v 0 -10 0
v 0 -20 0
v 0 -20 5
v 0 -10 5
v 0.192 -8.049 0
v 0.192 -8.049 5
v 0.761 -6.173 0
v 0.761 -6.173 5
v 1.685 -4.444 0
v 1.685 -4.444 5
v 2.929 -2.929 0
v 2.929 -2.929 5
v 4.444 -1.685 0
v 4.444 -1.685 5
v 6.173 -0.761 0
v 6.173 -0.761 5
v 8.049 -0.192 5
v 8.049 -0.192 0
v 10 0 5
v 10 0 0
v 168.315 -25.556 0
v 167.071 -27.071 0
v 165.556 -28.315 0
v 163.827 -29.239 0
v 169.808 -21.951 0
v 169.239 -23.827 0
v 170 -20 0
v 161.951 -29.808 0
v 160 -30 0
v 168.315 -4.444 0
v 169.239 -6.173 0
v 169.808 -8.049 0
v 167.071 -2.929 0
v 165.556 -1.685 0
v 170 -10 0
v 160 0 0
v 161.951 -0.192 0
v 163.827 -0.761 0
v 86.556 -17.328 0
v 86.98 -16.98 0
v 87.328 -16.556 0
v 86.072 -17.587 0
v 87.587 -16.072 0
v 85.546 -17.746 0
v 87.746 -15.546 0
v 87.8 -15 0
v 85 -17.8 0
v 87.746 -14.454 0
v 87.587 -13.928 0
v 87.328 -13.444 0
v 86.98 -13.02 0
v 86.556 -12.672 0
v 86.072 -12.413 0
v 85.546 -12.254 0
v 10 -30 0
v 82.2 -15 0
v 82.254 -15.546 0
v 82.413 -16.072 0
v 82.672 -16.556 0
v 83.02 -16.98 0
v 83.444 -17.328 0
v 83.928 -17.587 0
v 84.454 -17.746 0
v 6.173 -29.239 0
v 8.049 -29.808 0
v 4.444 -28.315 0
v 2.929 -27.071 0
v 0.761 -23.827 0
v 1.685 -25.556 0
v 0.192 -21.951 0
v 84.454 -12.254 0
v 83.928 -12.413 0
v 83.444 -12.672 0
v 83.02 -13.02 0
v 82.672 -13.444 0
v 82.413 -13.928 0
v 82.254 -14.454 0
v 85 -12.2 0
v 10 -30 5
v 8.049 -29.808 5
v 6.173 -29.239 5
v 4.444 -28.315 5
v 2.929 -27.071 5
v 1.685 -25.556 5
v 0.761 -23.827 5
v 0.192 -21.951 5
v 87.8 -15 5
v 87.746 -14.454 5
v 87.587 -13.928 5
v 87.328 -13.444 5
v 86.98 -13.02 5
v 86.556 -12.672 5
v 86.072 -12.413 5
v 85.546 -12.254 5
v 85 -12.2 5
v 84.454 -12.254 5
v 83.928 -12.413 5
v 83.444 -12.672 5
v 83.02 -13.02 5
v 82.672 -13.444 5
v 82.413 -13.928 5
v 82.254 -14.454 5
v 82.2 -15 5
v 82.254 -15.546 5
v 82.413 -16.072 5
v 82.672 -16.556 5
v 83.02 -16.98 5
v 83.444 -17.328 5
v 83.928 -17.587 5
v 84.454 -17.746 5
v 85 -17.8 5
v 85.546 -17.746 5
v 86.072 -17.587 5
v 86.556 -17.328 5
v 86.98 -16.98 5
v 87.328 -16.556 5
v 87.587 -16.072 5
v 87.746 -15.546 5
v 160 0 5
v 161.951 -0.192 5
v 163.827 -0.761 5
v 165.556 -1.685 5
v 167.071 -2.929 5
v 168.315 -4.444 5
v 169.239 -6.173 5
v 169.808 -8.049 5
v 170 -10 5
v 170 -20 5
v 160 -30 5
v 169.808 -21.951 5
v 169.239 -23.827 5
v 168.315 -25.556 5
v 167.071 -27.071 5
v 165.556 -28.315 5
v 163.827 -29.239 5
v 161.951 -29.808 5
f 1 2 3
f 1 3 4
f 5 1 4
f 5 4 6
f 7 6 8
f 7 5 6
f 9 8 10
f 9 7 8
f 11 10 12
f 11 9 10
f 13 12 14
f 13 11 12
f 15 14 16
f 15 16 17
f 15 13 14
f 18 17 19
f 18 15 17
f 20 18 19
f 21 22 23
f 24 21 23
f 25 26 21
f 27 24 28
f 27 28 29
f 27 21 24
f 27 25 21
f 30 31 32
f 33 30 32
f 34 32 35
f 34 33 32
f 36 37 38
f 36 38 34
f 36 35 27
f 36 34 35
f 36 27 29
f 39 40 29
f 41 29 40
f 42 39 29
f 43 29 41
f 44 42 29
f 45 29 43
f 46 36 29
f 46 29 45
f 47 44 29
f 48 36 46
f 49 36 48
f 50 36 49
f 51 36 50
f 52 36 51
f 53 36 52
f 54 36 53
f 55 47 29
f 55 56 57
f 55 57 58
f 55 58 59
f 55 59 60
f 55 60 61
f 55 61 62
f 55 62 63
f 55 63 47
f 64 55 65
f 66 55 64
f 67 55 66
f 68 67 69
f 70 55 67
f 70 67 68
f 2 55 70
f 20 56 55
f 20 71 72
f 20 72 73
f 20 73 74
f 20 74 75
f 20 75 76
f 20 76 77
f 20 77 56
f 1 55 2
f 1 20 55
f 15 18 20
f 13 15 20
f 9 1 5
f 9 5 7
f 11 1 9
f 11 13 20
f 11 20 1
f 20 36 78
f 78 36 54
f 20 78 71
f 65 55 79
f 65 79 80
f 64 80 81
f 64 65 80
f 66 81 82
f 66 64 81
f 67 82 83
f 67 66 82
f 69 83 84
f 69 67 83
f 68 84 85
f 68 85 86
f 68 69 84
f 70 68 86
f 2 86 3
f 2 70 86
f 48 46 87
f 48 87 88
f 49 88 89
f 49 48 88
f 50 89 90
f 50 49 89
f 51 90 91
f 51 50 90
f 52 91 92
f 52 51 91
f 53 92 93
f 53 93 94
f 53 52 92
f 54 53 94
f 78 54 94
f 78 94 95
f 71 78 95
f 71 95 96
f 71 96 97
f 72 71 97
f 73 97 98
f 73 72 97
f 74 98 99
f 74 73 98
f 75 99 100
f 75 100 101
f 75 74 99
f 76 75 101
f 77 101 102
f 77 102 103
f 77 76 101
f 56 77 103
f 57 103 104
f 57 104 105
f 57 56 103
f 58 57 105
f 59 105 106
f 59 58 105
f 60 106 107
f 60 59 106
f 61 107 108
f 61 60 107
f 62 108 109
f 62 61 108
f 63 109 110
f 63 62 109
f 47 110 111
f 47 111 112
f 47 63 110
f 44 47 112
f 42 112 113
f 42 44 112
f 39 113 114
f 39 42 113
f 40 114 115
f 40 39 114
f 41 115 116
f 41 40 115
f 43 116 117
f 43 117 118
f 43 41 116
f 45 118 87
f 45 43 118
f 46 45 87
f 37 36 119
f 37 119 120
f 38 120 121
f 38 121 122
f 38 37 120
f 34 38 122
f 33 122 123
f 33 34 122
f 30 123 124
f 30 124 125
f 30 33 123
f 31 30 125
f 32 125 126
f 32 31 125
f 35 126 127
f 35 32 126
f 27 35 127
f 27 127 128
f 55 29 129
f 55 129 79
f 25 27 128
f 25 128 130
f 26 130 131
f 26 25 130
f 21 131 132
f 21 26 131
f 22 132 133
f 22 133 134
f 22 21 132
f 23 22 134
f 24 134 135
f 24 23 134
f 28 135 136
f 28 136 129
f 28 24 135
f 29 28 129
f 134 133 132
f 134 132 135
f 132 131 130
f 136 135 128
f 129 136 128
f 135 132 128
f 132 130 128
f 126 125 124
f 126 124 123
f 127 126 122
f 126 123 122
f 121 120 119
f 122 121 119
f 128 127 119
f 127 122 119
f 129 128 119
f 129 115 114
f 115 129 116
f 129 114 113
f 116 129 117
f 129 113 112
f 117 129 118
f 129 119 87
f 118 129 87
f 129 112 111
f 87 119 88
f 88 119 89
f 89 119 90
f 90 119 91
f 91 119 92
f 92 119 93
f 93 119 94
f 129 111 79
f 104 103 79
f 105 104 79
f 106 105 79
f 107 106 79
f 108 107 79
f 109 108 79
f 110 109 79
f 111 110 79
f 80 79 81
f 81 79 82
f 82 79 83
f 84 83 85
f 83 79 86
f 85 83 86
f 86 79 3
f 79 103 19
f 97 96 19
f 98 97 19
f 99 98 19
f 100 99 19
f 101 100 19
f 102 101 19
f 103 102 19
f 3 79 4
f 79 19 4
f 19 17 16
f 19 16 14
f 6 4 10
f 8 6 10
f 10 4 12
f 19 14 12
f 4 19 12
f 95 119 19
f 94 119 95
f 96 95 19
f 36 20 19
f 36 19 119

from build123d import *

# Parameters (mm, degrees)
ESQUISSE1_R        = 2.8
BOSS_EXTRU_1_DEPTH = 5


with BuildPart() as part:
    # Esquisse1 → Boss.-Extru.1 (new body)
    with BuildSketch(Plane.XY):
        with BuildLine():
            Line((10, 0), (160, 0))
            ThreePointArc((160, 0), (167.071067812, -2.928932188), (170, -10))
            Line((170, -10), (170, -20))
            ThreePointArc((170, -20), (167.071067812, -27.071067812), (160, -30))
            Line((160, -30), (10, -30))
            ThreePointArc((10, -30), (2.928932188, -27.071067812), (0, -20))
            Line((0, -20), (0, -10))
            ThreePointArc((0, -10), (2.928932188, -2.928932188), (10, 0))
        make_face()
        with Locations((85, -15)):
            Circle(ESQUISSE1_R, mode=Mode.SUBTRACT)
    extrude(amount=BOSS_EXTRU_1_DEPTH)


solid = part.part
